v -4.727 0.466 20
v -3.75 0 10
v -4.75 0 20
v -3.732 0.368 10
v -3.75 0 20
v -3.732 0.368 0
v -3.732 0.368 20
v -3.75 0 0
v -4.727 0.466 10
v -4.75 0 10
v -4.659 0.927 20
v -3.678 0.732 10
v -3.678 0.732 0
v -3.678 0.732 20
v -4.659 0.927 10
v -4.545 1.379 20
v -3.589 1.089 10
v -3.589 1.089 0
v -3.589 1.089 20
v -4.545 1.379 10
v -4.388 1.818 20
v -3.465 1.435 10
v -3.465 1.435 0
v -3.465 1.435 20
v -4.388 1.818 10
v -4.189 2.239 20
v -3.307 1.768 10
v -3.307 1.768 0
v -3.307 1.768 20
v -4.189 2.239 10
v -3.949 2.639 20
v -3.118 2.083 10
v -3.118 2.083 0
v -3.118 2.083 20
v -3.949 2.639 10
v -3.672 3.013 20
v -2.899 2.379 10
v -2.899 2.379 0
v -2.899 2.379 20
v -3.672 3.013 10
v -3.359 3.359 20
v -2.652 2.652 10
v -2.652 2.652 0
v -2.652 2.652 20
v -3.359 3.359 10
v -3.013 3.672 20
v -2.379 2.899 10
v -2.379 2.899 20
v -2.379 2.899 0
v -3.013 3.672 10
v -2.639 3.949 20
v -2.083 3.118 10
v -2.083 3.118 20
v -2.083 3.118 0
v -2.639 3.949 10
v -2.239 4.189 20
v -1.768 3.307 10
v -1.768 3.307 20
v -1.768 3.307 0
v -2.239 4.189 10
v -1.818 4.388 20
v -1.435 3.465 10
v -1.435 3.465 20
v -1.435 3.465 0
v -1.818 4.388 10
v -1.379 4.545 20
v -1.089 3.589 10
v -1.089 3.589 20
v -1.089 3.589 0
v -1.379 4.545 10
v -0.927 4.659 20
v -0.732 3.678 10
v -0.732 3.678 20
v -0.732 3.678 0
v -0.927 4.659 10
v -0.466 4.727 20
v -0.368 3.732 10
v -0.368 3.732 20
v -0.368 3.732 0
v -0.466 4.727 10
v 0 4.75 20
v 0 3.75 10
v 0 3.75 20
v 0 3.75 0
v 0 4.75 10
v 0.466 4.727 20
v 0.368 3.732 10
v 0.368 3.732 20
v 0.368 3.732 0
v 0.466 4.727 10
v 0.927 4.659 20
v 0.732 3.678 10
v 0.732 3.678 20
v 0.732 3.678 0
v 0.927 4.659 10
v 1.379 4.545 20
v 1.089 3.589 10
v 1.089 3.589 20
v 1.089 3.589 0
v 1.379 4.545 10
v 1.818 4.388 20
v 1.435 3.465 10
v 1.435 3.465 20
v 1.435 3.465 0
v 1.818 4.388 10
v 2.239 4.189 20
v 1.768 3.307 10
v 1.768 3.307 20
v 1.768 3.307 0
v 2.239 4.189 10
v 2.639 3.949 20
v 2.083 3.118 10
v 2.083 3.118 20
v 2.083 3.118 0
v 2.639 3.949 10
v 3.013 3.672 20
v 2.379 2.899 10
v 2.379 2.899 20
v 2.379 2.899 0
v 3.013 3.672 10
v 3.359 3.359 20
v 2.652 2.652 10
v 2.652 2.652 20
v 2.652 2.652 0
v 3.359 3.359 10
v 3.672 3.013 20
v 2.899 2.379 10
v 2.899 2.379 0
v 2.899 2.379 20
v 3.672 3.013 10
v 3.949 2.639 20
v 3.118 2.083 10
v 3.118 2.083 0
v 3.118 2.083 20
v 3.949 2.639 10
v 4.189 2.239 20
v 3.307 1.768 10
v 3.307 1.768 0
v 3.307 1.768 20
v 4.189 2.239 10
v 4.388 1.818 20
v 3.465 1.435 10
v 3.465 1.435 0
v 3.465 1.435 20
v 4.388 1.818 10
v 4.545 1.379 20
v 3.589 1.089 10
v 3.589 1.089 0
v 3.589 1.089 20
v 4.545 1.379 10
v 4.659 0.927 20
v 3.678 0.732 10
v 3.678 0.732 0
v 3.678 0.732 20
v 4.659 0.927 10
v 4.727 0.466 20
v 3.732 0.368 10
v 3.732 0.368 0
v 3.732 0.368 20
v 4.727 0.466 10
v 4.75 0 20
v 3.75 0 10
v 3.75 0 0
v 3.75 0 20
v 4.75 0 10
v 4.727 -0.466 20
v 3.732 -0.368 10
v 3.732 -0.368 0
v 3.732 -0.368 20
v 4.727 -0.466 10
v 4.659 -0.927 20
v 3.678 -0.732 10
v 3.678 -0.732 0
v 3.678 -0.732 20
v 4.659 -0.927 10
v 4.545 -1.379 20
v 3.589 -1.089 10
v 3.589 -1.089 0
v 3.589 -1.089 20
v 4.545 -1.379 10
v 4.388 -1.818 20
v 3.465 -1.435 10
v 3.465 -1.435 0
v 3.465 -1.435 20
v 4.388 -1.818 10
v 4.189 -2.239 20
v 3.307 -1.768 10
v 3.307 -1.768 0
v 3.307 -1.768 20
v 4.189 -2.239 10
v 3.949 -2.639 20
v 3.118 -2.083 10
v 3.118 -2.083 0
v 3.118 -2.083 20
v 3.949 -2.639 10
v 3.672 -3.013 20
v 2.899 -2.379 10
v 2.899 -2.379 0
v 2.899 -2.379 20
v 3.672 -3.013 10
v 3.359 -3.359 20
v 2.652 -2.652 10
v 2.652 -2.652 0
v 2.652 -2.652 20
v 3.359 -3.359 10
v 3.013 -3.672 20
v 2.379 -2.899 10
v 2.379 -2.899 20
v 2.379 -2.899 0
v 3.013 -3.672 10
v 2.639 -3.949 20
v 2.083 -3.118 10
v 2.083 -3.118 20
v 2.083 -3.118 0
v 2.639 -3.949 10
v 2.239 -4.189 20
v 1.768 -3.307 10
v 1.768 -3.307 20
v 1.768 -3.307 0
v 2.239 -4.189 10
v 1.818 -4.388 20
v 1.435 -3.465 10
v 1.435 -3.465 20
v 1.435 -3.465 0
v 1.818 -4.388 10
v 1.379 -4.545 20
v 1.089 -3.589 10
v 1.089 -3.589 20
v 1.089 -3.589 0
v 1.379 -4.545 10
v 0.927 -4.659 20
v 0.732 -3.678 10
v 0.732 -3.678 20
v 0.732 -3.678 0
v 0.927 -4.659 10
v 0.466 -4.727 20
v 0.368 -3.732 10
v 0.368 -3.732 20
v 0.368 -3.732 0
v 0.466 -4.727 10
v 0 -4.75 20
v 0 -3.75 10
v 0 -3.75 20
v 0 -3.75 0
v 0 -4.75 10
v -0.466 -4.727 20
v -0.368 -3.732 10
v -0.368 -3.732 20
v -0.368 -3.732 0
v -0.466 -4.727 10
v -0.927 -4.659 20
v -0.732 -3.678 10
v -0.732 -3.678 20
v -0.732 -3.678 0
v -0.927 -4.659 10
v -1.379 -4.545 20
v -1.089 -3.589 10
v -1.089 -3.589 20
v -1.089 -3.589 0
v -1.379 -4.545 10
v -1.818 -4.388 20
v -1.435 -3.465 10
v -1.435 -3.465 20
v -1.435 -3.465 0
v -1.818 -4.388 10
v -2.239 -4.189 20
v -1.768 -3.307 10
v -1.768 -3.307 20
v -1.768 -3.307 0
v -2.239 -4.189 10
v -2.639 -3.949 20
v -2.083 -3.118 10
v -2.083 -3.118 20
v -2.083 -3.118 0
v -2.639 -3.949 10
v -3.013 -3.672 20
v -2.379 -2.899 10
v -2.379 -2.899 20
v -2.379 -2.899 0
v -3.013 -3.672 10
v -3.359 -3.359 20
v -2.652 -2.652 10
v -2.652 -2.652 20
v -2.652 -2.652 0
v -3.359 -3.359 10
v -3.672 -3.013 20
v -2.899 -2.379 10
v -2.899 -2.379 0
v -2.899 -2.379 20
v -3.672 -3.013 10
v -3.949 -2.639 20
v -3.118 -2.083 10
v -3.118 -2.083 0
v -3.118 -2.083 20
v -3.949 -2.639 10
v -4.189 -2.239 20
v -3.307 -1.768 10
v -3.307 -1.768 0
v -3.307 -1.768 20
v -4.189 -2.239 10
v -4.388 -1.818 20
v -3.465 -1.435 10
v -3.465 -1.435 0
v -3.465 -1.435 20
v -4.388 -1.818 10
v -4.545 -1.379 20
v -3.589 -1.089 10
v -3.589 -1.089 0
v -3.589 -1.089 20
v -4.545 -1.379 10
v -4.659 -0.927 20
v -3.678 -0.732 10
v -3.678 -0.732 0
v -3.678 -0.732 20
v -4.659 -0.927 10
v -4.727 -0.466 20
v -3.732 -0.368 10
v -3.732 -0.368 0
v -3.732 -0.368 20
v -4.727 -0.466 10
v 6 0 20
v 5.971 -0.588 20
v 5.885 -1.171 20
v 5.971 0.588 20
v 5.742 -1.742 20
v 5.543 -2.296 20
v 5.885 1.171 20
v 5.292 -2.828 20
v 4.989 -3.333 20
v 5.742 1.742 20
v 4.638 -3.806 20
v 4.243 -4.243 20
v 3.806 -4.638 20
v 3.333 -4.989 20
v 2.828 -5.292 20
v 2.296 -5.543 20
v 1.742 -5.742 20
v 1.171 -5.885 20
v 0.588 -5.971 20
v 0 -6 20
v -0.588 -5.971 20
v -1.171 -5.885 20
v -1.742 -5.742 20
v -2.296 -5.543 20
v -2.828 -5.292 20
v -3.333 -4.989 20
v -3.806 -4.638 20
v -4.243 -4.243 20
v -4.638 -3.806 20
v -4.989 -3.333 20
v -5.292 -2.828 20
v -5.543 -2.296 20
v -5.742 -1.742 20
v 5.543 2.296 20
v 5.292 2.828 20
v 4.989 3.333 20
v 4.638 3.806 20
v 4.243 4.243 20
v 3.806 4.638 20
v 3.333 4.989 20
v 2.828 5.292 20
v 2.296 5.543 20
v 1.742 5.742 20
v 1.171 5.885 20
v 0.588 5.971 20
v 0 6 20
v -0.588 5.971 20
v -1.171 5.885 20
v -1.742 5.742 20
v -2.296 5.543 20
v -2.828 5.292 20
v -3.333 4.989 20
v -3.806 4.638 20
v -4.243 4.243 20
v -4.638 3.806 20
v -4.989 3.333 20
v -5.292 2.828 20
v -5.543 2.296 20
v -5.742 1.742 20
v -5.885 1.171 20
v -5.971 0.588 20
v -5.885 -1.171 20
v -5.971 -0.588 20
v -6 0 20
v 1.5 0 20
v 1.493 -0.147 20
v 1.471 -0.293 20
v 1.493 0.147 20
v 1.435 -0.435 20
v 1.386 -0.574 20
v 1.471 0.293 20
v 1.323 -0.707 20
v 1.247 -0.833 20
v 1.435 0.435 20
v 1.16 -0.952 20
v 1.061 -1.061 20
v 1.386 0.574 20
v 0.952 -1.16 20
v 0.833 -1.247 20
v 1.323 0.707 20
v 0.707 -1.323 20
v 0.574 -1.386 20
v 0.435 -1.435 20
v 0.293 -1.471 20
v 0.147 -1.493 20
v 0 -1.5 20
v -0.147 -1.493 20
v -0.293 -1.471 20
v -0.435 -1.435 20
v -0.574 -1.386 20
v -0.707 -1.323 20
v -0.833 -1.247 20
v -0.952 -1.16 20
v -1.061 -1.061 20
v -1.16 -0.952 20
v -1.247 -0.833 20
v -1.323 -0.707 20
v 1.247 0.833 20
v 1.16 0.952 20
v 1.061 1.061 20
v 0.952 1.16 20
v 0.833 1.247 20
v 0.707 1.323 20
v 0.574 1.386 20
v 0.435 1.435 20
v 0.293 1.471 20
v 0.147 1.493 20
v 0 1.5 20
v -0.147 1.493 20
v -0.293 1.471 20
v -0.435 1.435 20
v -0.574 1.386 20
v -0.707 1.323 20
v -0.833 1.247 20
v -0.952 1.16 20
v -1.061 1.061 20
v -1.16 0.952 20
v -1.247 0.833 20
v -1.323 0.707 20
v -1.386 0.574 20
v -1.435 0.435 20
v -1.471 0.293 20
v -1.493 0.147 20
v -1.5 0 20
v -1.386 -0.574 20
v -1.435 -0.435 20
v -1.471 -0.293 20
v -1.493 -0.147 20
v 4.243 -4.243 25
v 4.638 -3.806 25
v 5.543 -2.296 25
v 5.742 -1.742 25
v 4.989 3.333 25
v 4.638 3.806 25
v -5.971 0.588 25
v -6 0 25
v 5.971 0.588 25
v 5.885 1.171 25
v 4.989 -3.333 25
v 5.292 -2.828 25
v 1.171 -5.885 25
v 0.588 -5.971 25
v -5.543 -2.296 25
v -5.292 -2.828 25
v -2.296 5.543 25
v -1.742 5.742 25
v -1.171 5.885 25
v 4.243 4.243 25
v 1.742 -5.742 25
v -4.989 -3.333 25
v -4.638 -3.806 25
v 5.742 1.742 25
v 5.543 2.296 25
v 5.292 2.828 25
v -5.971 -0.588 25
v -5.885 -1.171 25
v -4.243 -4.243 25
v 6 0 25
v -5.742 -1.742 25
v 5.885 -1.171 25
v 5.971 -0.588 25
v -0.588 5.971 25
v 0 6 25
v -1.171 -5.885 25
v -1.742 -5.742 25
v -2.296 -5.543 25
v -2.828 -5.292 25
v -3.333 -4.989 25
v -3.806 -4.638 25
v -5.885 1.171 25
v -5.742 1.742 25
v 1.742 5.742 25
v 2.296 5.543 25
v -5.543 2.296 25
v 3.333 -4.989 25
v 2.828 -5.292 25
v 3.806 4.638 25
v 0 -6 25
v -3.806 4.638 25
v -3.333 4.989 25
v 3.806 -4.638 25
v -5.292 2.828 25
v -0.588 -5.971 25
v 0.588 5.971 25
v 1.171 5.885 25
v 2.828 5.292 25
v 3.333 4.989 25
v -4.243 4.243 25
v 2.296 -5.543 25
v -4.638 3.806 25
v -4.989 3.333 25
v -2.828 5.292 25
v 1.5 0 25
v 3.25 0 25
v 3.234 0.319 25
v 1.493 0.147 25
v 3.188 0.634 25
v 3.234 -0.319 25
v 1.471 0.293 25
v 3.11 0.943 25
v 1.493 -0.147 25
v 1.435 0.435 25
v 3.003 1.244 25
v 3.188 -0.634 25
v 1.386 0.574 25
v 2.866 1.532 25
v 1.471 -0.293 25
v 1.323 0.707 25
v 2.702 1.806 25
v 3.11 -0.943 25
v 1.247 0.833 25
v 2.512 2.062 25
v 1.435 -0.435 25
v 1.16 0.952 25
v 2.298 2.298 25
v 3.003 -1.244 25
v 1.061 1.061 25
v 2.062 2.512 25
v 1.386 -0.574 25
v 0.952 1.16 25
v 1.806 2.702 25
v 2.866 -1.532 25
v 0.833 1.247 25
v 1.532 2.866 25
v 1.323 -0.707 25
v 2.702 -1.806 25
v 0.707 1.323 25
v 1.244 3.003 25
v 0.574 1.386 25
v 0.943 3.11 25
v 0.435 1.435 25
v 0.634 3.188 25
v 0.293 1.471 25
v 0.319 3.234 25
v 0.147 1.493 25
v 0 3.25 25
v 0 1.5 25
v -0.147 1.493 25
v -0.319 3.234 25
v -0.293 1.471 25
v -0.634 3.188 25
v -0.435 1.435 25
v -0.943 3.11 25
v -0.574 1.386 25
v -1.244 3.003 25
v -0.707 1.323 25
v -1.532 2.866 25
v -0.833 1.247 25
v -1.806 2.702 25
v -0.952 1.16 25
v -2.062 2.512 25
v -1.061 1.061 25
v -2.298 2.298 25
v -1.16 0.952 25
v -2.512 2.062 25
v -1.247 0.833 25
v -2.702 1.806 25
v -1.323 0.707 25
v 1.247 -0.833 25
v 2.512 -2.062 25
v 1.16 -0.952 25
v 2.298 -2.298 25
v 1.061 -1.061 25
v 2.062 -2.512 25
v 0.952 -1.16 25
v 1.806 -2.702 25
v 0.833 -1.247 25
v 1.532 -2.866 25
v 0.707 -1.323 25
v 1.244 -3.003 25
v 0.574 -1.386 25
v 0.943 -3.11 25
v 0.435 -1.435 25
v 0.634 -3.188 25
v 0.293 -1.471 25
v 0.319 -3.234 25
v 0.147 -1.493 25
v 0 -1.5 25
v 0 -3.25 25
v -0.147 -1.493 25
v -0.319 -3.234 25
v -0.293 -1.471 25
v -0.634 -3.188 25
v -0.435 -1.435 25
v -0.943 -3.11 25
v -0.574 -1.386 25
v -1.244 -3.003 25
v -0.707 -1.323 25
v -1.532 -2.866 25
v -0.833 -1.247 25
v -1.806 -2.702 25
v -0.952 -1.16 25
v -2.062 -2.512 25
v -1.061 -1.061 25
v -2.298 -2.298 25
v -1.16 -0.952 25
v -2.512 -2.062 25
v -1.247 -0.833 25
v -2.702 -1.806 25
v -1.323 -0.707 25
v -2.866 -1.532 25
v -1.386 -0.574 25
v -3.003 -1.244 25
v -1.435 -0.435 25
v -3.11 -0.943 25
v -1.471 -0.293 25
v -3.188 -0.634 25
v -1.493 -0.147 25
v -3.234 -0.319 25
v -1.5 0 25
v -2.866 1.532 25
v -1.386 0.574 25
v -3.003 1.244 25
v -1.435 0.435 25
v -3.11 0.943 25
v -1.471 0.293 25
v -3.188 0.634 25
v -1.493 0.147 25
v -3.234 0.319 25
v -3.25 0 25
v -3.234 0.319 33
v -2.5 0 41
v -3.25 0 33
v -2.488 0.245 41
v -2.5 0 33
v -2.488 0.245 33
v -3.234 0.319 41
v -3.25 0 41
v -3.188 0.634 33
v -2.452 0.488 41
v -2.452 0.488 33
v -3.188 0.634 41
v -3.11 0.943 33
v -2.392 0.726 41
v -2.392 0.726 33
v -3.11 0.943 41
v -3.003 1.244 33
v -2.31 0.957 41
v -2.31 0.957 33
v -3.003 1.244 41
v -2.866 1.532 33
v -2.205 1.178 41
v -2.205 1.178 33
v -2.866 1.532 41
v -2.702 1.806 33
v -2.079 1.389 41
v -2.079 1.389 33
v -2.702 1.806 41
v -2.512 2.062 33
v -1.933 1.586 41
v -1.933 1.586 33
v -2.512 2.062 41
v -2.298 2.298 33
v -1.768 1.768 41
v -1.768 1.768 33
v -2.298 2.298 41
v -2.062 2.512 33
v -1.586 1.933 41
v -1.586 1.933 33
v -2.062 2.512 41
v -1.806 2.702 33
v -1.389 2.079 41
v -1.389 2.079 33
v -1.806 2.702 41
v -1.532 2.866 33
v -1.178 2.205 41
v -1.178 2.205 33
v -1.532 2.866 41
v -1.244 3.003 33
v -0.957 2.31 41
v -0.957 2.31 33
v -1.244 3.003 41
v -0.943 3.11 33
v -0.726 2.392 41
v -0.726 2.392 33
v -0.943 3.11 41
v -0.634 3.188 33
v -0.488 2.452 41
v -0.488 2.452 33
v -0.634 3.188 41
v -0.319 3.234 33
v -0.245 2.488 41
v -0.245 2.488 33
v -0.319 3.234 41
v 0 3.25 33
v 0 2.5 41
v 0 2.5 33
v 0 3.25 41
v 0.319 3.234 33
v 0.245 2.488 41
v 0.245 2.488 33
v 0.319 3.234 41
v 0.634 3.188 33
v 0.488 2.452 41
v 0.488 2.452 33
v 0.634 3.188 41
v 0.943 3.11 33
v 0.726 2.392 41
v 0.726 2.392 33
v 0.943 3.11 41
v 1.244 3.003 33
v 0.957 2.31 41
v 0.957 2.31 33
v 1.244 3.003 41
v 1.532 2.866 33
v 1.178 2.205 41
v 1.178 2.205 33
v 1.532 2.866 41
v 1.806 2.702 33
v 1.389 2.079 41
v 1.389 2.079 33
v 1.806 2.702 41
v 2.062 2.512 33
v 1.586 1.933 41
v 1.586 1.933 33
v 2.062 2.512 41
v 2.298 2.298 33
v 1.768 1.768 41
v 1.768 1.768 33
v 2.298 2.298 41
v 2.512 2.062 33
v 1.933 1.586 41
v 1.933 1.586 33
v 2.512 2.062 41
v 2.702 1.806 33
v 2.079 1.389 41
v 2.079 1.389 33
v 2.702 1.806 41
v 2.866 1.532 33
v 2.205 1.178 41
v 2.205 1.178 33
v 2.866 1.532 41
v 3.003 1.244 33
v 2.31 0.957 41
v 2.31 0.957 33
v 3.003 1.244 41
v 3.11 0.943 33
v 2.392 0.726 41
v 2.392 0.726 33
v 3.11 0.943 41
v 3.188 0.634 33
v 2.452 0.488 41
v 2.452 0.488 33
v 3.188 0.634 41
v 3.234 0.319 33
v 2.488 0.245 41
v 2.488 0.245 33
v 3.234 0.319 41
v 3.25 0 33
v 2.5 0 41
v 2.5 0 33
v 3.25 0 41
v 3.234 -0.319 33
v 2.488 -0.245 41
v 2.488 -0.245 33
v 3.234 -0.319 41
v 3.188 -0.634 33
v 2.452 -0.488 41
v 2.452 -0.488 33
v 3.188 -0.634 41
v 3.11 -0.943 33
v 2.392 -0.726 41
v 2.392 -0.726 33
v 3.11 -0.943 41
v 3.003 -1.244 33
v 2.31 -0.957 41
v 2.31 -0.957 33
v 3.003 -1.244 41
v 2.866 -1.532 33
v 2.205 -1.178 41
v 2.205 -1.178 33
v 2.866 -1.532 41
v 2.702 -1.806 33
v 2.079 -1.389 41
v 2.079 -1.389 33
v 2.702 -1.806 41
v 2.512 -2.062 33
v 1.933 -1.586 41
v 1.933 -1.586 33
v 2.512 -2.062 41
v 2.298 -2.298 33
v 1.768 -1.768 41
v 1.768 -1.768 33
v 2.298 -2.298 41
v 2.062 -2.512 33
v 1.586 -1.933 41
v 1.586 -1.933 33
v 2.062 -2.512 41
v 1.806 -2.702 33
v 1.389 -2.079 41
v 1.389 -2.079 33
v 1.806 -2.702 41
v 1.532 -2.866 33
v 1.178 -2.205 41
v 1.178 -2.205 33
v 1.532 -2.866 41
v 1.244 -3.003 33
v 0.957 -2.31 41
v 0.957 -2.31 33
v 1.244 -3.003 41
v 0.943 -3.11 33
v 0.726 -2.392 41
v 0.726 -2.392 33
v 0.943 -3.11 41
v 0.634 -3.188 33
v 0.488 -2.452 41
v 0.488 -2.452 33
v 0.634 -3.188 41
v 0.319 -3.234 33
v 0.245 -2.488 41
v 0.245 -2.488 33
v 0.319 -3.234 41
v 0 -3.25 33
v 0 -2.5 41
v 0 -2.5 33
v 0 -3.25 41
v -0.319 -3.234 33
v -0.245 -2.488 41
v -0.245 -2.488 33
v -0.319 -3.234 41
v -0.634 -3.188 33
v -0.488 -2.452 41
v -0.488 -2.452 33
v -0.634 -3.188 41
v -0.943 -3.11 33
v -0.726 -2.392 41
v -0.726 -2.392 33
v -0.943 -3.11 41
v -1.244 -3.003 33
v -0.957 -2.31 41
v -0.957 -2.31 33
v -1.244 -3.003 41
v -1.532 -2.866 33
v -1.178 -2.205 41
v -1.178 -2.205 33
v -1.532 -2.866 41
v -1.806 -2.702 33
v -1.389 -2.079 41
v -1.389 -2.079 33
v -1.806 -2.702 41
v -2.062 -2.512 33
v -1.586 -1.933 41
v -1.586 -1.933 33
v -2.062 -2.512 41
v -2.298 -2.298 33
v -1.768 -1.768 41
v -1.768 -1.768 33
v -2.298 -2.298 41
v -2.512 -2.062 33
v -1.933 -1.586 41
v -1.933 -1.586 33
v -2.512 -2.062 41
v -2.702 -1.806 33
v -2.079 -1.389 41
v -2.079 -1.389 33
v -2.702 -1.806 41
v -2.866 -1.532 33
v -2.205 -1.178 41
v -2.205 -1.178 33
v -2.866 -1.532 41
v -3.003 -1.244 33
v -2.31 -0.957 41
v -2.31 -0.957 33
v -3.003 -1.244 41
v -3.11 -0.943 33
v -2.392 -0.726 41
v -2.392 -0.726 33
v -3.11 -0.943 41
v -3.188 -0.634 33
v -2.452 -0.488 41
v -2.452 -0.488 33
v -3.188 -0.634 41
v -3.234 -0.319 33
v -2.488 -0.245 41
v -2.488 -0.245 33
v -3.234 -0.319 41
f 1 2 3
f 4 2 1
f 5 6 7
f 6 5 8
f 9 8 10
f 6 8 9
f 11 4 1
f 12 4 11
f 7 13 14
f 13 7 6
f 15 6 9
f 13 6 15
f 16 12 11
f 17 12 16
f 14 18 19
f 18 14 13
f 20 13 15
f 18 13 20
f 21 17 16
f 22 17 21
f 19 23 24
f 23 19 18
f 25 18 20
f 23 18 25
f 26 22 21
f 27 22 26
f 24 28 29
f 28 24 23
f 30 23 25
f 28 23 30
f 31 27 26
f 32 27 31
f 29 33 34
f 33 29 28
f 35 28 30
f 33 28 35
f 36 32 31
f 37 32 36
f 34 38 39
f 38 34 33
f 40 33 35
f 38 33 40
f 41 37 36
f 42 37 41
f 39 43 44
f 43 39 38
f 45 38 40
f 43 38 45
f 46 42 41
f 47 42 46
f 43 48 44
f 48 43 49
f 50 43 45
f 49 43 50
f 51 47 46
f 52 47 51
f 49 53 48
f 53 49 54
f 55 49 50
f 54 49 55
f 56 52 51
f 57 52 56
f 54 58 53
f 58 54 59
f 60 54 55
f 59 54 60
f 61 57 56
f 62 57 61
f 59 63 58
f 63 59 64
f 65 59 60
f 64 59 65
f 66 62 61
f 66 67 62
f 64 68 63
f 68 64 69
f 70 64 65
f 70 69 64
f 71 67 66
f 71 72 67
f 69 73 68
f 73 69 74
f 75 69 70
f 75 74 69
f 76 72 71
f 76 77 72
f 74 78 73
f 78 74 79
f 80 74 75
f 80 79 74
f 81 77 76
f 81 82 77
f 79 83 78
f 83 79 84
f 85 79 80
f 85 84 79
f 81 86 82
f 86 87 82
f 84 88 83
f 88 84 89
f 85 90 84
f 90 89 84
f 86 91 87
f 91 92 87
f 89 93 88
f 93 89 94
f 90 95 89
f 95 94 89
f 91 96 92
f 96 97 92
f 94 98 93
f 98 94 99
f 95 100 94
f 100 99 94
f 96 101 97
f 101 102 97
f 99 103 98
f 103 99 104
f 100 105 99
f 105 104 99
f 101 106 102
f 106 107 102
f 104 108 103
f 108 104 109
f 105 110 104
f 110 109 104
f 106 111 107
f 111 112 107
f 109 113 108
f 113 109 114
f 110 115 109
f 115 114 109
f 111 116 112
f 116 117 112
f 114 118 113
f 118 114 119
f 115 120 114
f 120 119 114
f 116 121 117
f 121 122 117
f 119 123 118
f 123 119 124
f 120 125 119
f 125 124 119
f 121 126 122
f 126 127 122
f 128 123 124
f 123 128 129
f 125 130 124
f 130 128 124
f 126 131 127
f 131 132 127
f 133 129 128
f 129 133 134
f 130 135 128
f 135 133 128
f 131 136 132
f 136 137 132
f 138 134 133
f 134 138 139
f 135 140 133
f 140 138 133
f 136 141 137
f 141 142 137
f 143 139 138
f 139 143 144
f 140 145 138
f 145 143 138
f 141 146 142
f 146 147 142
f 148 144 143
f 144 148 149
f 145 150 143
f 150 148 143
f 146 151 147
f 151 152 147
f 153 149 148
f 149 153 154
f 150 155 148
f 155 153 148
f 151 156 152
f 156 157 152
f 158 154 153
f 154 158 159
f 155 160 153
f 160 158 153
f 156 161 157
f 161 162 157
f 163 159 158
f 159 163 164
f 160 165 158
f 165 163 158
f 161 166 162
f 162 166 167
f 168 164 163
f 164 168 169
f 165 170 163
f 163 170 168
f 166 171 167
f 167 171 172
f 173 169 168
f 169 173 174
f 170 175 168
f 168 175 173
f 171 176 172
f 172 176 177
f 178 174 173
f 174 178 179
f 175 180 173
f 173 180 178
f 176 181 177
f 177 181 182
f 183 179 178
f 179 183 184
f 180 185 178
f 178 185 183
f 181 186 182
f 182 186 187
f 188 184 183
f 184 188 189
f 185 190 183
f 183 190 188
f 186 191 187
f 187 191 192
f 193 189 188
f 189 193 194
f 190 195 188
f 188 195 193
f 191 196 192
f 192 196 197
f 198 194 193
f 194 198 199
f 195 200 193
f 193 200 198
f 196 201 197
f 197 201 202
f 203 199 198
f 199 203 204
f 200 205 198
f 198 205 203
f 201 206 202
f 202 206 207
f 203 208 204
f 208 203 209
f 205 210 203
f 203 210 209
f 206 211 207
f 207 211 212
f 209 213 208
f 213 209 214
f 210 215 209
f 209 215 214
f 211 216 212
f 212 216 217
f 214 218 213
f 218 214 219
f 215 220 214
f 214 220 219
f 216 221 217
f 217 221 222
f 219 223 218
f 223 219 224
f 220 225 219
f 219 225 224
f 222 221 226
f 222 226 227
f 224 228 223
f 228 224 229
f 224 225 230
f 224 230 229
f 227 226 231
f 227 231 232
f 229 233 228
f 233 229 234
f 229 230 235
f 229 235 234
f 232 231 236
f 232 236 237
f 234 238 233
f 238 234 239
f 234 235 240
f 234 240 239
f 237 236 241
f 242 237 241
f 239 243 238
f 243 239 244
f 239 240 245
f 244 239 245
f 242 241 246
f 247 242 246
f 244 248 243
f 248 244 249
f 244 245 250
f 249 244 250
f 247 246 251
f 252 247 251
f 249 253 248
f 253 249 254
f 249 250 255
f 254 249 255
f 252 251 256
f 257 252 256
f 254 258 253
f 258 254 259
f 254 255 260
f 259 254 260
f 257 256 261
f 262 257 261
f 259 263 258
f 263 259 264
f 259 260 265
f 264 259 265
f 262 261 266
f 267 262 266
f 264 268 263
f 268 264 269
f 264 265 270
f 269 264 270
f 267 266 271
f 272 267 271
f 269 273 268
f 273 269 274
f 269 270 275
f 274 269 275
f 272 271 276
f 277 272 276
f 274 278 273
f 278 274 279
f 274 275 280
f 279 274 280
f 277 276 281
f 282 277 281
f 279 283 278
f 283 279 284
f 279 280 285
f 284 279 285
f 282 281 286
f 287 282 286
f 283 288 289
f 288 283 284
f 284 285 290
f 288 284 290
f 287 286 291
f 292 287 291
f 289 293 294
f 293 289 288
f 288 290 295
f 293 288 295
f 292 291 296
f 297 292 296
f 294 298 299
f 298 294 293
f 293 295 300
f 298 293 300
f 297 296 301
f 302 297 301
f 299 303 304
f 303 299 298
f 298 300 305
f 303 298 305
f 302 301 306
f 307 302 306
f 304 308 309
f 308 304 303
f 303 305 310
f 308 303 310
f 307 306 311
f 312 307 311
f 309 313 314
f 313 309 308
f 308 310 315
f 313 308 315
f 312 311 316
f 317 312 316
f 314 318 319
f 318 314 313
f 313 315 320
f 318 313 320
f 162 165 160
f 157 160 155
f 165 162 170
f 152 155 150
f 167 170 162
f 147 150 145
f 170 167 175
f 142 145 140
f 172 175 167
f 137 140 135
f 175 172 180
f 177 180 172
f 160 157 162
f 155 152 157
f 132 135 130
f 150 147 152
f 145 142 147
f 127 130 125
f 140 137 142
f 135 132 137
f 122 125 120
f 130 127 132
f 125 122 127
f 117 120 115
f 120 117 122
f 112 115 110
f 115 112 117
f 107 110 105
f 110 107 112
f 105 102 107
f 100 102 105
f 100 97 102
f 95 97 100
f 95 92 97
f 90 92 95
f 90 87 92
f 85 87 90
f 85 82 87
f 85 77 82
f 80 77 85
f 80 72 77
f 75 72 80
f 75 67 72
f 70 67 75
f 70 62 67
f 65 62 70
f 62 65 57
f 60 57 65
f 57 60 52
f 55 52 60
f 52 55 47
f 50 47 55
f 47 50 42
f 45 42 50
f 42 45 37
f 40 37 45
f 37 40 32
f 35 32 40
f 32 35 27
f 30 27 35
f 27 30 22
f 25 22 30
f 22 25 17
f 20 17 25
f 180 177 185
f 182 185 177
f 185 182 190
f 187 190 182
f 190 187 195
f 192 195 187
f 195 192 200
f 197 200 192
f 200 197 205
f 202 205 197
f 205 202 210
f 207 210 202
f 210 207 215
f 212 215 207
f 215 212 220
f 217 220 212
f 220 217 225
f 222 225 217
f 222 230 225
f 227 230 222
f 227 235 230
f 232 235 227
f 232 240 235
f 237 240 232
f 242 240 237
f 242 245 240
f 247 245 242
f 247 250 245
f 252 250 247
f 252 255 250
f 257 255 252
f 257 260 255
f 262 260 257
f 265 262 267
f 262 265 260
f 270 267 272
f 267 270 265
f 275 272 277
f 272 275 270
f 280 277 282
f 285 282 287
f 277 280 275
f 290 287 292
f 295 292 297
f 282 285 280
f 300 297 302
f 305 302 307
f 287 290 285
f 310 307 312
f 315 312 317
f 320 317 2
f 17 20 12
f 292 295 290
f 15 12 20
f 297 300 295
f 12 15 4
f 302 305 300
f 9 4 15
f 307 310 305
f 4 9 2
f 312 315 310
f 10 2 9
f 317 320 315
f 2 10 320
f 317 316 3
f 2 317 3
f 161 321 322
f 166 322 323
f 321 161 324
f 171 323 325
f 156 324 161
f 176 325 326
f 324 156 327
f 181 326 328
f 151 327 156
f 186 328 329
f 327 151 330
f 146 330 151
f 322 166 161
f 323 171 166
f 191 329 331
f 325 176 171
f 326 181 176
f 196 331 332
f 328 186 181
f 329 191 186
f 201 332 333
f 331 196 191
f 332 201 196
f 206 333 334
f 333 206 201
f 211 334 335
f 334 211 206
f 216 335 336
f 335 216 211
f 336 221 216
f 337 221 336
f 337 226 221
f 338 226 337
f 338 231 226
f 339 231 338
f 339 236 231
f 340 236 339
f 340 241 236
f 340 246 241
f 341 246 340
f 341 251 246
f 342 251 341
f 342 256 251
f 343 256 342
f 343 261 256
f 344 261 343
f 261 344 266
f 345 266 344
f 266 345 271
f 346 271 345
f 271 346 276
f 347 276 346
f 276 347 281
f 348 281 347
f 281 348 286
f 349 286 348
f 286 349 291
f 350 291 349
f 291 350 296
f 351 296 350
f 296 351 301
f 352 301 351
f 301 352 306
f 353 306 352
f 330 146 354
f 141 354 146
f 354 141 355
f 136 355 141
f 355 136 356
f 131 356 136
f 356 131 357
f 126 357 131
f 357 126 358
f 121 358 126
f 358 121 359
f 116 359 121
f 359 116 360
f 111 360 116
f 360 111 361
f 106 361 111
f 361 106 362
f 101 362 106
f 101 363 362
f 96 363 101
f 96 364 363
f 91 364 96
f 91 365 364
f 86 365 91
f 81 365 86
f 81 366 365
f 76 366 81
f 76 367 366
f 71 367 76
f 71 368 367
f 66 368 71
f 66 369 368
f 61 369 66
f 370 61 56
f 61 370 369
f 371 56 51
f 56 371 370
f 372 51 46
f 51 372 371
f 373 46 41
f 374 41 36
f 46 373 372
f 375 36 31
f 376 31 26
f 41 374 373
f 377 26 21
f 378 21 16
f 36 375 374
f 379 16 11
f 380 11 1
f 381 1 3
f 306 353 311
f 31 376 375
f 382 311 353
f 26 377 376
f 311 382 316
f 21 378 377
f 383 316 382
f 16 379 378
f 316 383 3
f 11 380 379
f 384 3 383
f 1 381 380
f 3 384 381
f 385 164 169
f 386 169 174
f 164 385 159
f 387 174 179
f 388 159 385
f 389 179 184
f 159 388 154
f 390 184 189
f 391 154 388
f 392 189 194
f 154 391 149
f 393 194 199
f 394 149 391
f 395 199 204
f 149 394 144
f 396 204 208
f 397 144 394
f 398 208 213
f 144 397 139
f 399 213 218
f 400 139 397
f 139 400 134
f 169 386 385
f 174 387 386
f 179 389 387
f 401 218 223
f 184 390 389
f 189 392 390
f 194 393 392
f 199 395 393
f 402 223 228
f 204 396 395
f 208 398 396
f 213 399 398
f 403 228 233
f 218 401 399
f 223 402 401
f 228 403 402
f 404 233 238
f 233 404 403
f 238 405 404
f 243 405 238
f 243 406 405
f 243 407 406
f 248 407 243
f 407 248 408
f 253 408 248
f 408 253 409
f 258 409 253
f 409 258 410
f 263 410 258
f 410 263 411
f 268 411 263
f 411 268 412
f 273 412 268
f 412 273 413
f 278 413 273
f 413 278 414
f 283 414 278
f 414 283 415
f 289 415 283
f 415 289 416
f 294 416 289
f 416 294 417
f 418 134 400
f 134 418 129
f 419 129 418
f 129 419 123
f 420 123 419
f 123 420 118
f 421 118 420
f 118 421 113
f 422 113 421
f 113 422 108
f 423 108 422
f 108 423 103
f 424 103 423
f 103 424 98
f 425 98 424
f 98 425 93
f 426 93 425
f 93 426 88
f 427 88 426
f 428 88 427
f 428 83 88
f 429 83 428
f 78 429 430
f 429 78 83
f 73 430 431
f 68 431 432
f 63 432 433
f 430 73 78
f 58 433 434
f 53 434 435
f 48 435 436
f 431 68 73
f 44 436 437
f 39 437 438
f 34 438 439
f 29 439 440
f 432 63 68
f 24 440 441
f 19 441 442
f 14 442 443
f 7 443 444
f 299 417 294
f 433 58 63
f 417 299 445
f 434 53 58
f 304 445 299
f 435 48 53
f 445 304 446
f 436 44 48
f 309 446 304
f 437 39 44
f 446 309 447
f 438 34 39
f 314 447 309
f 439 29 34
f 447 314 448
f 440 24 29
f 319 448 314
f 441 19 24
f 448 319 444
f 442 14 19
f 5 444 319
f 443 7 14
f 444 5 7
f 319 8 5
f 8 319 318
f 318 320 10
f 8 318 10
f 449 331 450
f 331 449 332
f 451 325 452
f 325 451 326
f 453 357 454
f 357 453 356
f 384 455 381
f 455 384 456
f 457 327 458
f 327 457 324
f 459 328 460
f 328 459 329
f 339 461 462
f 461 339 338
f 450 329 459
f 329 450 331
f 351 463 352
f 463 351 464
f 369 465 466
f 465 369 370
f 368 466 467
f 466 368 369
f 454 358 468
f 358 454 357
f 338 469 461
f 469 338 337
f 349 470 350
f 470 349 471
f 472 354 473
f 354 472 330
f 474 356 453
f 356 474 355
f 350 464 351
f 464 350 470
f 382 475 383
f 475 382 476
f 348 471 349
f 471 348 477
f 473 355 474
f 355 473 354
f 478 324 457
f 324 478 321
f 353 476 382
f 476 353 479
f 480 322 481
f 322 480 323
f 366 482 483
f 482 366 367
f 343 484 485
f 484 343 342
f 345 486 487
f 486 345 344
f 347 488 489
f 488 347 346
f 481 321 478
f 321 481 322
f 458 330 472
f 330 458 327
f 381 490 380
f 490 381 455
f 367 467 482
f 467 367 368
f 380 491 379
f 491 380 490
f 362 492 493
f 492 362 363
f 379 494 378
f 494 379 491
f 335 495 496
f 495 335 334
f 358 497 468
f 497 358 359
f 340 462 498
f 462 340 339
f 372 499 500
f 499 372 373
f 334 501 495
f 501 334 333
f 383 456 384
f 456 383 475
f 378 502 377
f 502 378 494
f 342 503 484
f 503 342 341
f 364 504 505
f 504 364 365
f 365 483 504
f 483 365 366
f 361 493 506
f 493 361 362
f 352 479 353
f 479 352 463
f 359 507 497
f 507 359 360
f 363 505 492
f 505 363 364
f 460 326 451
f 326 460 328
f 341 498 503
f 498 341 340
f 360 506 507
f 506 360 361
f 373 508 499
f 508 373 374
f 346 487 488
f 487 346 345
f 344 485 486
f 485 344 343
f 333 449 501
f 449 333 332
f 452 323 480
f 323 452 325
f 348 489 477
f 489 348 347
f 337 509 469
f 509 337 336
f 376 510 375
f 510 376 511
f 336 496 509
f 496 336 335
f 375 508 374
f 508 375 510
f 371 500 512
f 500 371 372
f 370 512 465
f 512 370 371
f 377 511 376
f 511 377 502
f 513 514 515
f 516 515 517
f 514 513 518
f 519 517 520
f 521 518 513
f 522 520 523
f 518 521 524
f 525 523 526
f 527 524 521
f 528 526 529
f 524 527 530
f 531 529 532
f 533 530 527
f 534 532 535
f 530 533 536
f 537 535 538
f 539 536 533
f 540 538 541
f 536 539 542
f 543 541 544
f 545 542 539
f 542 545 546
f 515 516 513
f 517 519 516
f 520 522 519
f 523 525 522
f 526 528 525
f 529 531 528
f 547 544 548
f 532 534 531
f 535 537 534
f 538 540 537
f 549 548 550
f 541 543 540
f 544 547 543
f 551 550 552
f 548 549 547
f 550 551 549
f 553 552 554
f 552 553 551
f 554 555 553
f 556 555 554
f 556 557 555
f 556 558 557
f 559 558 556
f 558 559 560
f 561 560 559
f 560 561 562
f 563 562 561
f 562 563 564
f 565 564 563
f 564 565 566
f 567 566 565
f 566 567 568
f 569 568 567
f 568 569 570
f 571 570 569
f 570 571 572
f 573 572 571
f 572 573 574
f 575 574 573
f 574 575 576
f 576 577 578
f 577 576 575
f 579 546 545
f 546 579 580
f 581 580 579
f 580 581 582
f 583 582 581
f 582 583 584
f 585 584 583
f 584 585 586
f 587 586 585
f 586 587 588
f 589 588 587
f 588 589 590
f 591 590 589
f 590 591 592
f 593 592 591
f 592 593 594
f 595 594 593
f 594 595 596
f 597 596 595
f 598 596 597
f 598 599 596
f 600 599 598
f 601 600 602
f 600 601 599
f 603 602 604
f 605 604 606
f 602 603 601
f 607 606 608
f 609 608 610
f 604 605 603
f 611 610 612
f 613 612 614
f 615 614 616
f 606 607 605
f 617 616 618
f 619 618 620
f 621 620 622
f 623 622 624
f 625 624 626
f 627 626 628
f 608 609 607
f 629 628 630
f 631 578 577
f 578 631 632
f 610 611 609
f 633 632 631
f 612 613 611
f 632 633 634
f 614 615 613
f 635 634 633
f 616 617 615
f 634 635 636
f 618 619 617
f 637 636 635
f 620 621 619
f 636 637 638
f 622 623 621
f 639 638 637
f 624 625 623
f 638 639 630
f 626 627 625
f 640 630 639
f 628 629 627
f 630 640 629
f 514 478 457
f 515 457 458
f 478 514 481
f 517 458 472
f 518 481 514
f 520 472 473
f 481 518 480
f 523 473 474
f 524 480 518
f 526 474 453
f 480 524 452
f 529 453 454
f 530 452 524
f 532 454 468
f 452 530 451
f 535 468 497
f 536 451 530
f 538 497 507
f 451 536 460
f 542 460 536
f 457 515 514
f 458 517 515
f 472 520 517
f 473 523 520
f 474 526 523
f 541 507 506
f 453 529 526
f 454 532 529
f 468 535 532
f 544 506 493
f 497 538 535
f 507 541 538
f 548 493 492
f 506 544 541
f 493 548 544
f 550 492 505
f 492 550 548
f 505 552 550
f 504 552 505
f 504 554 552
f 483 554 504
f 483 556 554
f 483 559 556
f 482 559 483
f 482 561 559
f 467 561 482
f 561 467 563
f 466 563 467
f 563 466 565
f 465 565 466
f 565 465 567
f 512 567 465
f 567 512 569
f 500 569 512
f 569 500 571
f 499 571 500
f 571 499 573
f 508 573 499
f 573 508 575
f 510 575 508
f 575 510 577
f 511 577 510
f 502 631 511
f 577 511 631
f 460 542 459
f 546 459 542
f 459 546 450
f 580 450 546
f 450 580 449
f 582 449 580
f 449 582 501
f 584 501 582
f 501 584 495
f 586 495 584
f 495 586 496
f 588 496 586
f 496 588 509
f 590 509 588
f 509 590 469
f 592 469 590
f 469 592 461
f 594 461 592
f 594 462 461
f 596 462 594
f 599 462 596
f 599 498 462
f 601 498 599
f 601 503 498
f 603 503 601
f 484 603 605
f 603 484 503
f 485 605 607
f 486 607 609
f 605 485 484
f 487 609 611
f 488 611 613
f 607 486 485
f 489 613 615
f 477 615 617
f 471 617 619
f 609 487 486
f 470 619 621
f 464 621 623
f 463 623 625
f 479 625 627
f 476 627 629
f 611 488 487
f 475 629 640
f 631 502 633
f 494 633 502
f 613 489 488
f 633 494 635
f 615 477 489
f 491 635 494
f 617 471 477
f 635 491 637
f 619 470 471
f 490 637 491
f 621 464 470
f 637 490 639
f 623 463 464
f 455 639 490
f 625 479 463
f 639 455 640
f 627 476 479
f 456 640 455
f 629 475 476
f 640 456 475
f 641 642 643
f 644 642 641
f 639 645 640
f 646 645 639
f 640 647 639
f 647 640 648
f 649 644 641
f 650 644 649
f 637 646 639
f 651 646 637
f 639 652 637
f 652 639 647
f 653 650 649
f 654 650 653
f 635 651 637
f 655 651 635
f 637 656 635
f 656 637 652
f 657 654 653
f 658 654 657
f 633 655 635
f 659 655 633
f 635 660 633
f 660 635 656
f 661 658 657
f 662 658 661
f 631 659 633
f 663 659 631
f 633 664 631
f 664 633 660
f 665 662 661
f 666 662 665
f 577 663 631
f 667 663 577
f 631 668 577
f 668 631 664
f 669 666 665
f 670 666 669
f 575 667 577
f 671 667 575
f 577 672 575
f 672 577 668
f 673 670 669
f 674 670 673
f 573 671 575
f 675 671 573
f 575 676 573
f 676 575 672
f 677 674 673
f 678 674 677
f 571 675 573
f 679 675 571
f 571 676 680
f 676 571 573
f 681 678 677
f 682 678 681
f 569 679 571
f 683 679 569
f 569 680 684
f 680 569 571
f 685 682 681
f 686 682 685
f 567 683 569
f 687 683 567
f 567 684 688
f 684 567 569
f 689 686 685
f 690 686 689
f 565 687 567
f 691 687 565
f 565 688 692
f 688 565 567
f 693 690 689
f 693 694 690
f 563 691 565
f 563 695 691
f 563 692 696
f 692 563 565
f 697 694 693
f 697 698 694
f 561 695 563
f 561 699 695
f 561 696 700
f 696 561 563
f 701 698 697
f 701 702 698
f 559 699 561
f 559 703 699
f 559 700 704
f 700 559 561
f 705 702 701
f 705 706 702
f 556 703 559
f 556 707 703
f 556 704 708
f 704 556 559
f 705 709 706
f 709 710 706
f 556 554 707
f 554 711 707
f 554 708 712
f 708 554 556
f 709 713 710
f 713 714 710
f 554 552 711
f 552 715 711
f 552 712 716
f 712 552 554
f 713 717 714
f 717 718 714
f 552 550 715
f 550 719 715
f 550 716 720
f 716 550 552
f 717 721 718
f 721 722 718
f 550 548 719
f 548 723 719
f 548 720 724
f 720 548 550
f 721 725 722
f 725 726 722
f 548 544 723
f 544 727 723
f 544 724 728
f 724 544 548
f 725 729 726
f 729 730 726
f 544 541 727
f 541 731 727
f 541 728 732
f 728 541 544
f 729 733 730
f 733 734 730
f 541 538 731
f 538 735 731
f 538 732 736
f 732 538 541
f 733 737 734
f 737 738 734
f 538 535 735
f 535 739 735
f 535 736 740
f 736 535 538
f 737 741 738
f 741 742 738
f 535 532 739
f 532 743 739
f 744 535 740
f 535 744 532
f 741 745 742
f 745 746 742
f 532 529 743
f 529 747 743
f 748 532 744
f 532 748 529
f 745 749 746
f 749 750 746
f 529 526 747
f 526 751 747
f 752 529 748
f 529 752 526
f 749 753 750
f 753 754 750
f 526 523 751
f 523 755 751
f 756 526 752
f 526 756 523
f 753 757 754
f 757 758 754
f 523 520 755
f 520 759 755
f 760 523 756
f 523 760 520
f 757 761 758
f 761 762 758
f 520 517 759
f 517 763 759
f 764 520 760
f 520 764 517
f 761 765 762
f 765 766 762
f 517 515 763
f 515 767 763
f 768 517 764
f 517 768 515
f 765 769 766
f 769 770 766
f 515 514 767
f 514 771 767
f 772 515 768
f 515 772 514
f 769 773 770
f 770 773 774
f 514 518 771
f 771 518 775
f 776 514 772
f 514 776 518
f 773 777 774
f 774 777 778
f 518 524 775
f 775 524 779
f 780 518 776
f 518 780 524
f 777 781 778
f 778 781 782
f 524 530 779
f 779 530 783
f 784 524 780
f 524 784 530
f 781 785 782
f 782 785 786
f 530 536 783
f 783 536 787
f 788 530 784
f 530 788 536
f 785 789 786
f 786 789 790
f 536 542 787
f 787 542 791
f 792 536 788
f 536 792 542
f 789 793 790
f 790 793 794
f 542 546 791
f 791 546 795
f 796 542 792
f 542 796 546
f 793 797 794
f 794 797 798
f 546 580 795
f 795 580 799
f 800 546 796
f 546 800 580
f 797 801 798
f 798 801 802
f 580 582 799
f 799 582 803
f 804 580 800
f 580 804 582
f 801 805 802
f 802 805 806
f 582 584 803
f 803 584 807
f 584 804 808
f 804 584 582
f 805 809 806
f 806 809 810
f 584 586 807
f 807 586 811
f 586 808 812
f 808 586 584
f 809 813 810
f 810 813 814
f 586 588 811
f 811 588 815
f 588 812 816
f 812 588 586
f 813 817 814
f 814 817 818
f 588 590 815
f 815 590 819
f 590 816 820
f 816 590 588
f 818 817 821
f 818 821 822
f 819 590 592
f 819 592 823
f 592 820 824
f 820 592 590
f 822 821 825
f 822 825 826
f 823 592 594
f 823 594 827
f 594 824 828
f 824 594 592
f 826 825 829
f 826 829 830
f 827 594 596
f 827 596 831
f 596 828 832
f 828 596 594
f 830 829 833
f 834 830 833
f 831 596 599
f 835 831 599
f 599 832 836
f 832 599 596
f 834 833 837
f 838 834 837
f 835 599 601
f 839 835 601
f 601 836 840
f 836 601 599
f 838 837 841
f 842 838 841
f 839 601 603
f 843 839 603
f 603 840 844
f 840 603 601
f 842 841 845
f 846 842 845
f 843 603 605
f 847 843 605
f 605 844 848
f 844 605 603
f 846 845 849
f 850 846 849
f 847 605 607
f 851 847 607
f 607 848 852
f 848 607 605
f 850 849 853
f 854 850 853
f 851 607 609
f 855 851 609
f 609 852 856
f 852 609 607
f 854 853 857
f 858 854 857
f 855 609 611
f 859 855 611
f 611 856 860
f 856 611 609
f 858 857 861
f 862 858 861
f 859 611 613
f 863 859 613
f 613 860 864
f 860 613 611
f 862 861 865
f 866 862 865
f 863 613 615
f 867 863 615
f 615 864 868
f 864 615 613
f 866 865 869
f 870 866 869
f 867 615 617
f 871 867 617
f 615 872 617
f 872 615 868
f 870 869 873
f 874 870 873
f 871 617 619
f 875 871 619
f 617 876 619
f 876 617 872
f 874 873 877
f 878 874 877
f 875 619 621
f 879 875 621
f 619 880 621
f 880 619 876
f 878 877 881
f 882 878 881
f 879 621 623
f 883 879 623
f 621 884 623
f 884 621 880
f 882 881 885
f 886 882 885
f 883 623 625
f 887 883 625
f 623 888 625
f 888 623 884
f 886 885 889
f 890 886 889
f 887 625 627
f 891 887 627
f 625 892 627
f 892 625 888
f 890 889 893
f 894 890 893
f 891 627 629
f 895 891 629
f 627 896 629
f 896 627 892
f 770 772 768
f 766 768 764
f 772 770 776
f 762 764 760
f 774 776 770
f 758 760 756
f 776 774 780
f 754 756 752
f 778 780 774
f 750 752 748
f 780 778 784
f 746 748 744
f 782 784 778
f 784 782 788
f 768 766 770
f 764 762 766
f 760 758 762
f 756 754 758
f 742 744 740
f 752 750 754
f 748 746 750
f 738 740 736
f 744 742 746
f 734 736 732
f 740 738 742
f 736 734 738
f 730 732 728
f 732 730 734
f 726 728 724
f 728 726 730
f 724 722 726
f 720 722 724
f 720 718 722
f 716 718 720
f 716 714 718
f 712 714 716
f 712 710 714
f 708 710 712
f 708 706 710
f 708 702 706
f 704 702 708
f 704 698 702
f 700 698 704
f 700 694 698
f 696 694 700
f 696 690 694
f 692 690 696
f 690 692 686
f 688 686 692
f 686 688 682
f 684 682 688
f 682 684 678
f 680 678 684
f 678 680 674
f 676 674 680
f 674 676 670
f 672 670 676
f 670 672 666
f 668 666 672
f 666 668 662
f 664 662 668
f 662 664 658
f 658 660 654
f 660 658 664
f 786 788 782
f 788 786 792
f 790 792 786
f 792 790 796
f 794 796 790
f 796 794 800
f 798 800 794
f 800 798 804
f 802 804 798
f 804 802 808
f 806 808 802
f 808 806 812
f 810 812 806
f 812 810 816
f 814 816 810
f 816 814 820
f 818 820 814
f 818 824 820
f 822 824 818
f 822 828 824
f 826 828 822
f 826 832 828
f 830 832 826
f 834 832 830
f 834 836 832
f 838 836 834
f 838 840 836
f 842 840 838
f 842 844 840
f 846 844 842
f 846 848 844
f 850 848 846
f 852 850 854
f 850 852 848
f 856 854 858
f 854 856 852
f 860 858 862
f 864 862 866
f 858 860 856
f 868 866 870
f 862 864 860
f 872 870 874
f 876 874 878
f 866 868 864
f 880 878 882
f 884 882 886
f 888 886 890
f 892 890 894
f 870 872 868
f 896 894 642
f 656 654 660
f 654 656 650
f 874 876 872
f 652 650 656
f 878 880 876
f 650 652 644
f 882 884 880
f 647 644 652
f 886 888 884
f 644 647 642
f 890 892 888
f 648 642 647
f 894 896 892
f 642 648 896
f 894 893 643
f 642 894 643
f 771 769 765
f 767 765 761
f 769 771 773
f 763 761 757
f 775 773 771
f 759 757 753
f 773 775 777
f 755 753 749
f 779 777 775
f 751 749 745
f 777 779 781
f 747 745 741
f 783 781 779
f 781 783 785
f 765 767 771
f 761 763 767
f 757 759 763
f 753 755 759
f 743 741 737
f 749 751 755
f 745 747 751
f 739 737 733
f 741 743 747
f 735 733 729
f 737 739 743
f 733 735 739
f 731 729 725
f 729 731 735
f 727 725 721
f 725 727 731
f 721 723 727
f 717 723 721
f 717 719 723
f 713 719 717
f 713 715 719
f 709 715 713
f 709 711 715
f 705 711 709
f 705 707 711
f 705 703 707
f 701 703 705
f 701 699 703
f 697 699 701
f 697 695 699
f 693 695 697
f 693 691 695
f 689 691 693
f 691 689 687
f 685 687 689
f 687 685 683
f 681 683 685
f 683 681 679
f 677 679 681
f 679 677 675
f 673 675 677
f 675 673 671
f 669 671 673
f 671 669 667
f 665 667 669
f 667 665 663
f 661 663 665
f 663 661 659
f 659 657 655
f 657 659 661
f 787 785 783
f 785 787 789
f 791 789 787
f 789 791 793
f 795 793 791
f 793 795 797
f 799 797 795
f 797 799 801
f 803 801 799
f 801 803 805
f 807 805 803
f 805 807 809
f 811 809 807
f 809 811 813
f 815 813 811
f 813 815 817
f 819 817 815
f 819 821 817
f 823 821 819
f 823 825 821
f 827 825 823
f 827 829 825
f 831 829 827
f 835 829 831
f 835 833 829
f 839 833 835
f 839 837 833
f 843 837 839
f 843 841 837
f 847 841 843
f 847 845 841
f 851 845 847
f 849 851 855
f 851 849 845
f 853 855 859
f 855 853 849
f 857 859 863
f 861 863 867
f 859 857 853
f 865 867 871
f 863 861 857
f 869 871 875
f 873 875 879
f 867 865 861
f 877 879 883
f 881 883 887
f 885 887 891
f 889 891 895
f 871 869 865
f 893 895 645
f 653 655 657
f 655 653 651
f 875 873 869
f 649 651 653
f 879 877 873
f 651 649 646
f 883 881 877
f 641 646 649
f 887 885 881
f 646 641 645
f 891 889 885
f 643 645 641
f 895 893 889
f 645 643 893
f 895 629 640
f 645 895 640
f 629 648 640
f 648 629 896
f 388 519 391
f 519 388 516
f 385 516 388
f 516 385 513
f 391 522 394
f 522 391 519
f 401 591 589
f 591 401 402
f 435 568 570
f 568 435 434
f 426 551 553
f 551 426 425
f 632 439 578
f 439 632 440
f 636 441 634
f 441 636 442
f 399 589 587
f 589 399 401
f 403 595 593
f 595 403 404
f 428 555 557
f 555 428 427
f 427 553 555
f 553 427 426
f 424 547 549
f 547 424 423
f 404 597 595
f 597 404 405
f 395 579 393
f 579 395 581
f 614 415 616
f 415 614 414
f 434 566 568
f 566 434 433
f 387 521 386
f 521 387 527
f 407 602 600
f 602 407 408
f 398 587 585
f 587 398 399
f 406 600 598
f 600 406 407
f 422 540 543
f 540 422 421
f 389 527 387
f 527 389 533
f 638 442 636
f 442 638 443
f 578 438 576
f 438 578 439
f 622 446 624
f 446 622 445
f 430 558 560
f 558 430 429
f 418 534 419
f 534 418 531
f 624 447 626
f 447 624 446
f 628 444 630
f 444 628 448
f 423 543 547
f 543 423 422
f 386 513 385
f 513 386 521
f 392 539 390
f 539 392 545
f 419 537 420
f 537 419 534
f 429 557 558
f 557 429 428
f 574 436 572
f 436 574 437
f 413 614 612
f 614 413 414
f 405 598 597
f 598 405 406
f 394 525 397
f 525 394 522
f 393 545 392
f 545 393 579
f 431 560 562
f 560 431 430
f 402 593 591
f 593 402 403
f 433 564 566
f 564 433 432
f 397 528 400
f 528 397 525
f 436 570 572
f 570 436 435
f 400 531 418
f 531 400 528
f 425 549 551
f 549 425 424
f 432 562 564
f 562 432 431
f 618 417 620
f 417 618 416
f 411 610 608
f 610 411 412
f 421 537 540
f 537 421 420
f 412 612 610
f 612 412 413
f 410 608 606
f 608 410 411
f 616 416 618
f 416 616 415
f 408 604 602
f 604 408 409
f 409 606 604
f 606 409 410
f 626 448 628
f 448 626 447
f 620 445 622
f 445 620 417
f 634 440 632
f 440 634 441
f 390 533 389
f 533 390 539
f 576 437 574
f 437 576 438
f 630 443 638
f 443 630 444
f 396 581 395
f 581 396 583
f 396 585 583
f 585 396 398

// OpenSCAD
// Hose Barb Reducer: 8mm ID to 5mm ID
// Designed for FDM printing, standing upright on Z axis.

// Global settings
$fn = 64; // High resolution for round holes

// --- Dimensions for 8mm Tubing Barbs (Bottom Section) ---
// Tubing ID
id_8mm = 8;
// Barb height
h_barb_8 = 10;
// Number of barbs
n_barb_8 = 2;
// Outer diameter at bottom of barb (shoulder)
od_8_bottom = 7.5;
// Outer diameter at top of barb (peak)
od_8_top = 9.5;
// Base height for this section
z_start_8 = 0;

// --- Dimensions for 5mm Tubing Barbs (Top Section) ---
// Tubing ID
id_5mm = 5;
// Barb height
h_barb_5 = 8;
// Number of barbs
n_barb_5 = 2;
// Outer diameter at bottom of barb (shoulder)
od_5_bottom = 6.5;
// Outer diameter at top of barb (peak)
od_5_top = 5.0;
// Base height for this section
z_start_5 = 25;

// --- Collar Dimensions ---
z_collar_start = 20;
z_collar_end = 25;
d_collar = 12;

// --- Bore Dimensions ---
d_bore = 3;
z_bore_start = -1; // Extend slightly past bottom
z_bore_end = 42;   // Extend slightly past top

// --- Main Construction ---
difference() {
    union() {
        // 1. Bottom Section: 8mm Barbs
        // Profile for bottom section (z=0 to z=20)
        // It consists of two barbs stacked.
        // Barb 1: z=0 to z=10
        // Barb 2: z=10 to z=20
        
        rotate_extrude(convexity = 10) {
            polygon(points = [
                [od_8_bottom/2, 0],
                [od_8_top/2, h_barb_8],
                [od_8_bottom/2, h_barb_8],
                [od_8_top/2, h_barb_8 * 2],
                [od_8_bottom/2, h_barb_8 * 2],
                [od_8_bottom/2, 0]
            ]);
        }
        
        // 2. Middle Section: Collar
        translate([0, 0, z_collar_start])
        cylinder(h = z_collar_end - z_collar_start, r = d_collar/2, center = false);
        
        // 3. Top Section: 5mm Barbs
        // Profile for top section (z=25 to z=41)
        // It consists of two barbs stacked.
        // Barb 1: z=25 to z=33
        // Barb 2: z=33 to z=41
        
        translate([0, 0, z_start_5])
        rotate_extrude(convexity = 10) {
            polygon(points = [
                [od_5_bottom/2, 0],
                [od_5_top/2, h_barb_5],
                [od_5_bottom/2, h_barb_5],
                [od_5_top/2, h_barb_5 * 2],
                [od_5_bottom/2, h_barb_5 * 2],
                [od_5_bottom/2, 0]
            ]);
        }
    }
    
    // 4. Bore Hole
    // A straight cylinder running through the entire part
    translate([0, 0, z_bore_start])
    cylinder(h = z_bore_end - z_bore_start, r = d_bore/2, center = false);
}
